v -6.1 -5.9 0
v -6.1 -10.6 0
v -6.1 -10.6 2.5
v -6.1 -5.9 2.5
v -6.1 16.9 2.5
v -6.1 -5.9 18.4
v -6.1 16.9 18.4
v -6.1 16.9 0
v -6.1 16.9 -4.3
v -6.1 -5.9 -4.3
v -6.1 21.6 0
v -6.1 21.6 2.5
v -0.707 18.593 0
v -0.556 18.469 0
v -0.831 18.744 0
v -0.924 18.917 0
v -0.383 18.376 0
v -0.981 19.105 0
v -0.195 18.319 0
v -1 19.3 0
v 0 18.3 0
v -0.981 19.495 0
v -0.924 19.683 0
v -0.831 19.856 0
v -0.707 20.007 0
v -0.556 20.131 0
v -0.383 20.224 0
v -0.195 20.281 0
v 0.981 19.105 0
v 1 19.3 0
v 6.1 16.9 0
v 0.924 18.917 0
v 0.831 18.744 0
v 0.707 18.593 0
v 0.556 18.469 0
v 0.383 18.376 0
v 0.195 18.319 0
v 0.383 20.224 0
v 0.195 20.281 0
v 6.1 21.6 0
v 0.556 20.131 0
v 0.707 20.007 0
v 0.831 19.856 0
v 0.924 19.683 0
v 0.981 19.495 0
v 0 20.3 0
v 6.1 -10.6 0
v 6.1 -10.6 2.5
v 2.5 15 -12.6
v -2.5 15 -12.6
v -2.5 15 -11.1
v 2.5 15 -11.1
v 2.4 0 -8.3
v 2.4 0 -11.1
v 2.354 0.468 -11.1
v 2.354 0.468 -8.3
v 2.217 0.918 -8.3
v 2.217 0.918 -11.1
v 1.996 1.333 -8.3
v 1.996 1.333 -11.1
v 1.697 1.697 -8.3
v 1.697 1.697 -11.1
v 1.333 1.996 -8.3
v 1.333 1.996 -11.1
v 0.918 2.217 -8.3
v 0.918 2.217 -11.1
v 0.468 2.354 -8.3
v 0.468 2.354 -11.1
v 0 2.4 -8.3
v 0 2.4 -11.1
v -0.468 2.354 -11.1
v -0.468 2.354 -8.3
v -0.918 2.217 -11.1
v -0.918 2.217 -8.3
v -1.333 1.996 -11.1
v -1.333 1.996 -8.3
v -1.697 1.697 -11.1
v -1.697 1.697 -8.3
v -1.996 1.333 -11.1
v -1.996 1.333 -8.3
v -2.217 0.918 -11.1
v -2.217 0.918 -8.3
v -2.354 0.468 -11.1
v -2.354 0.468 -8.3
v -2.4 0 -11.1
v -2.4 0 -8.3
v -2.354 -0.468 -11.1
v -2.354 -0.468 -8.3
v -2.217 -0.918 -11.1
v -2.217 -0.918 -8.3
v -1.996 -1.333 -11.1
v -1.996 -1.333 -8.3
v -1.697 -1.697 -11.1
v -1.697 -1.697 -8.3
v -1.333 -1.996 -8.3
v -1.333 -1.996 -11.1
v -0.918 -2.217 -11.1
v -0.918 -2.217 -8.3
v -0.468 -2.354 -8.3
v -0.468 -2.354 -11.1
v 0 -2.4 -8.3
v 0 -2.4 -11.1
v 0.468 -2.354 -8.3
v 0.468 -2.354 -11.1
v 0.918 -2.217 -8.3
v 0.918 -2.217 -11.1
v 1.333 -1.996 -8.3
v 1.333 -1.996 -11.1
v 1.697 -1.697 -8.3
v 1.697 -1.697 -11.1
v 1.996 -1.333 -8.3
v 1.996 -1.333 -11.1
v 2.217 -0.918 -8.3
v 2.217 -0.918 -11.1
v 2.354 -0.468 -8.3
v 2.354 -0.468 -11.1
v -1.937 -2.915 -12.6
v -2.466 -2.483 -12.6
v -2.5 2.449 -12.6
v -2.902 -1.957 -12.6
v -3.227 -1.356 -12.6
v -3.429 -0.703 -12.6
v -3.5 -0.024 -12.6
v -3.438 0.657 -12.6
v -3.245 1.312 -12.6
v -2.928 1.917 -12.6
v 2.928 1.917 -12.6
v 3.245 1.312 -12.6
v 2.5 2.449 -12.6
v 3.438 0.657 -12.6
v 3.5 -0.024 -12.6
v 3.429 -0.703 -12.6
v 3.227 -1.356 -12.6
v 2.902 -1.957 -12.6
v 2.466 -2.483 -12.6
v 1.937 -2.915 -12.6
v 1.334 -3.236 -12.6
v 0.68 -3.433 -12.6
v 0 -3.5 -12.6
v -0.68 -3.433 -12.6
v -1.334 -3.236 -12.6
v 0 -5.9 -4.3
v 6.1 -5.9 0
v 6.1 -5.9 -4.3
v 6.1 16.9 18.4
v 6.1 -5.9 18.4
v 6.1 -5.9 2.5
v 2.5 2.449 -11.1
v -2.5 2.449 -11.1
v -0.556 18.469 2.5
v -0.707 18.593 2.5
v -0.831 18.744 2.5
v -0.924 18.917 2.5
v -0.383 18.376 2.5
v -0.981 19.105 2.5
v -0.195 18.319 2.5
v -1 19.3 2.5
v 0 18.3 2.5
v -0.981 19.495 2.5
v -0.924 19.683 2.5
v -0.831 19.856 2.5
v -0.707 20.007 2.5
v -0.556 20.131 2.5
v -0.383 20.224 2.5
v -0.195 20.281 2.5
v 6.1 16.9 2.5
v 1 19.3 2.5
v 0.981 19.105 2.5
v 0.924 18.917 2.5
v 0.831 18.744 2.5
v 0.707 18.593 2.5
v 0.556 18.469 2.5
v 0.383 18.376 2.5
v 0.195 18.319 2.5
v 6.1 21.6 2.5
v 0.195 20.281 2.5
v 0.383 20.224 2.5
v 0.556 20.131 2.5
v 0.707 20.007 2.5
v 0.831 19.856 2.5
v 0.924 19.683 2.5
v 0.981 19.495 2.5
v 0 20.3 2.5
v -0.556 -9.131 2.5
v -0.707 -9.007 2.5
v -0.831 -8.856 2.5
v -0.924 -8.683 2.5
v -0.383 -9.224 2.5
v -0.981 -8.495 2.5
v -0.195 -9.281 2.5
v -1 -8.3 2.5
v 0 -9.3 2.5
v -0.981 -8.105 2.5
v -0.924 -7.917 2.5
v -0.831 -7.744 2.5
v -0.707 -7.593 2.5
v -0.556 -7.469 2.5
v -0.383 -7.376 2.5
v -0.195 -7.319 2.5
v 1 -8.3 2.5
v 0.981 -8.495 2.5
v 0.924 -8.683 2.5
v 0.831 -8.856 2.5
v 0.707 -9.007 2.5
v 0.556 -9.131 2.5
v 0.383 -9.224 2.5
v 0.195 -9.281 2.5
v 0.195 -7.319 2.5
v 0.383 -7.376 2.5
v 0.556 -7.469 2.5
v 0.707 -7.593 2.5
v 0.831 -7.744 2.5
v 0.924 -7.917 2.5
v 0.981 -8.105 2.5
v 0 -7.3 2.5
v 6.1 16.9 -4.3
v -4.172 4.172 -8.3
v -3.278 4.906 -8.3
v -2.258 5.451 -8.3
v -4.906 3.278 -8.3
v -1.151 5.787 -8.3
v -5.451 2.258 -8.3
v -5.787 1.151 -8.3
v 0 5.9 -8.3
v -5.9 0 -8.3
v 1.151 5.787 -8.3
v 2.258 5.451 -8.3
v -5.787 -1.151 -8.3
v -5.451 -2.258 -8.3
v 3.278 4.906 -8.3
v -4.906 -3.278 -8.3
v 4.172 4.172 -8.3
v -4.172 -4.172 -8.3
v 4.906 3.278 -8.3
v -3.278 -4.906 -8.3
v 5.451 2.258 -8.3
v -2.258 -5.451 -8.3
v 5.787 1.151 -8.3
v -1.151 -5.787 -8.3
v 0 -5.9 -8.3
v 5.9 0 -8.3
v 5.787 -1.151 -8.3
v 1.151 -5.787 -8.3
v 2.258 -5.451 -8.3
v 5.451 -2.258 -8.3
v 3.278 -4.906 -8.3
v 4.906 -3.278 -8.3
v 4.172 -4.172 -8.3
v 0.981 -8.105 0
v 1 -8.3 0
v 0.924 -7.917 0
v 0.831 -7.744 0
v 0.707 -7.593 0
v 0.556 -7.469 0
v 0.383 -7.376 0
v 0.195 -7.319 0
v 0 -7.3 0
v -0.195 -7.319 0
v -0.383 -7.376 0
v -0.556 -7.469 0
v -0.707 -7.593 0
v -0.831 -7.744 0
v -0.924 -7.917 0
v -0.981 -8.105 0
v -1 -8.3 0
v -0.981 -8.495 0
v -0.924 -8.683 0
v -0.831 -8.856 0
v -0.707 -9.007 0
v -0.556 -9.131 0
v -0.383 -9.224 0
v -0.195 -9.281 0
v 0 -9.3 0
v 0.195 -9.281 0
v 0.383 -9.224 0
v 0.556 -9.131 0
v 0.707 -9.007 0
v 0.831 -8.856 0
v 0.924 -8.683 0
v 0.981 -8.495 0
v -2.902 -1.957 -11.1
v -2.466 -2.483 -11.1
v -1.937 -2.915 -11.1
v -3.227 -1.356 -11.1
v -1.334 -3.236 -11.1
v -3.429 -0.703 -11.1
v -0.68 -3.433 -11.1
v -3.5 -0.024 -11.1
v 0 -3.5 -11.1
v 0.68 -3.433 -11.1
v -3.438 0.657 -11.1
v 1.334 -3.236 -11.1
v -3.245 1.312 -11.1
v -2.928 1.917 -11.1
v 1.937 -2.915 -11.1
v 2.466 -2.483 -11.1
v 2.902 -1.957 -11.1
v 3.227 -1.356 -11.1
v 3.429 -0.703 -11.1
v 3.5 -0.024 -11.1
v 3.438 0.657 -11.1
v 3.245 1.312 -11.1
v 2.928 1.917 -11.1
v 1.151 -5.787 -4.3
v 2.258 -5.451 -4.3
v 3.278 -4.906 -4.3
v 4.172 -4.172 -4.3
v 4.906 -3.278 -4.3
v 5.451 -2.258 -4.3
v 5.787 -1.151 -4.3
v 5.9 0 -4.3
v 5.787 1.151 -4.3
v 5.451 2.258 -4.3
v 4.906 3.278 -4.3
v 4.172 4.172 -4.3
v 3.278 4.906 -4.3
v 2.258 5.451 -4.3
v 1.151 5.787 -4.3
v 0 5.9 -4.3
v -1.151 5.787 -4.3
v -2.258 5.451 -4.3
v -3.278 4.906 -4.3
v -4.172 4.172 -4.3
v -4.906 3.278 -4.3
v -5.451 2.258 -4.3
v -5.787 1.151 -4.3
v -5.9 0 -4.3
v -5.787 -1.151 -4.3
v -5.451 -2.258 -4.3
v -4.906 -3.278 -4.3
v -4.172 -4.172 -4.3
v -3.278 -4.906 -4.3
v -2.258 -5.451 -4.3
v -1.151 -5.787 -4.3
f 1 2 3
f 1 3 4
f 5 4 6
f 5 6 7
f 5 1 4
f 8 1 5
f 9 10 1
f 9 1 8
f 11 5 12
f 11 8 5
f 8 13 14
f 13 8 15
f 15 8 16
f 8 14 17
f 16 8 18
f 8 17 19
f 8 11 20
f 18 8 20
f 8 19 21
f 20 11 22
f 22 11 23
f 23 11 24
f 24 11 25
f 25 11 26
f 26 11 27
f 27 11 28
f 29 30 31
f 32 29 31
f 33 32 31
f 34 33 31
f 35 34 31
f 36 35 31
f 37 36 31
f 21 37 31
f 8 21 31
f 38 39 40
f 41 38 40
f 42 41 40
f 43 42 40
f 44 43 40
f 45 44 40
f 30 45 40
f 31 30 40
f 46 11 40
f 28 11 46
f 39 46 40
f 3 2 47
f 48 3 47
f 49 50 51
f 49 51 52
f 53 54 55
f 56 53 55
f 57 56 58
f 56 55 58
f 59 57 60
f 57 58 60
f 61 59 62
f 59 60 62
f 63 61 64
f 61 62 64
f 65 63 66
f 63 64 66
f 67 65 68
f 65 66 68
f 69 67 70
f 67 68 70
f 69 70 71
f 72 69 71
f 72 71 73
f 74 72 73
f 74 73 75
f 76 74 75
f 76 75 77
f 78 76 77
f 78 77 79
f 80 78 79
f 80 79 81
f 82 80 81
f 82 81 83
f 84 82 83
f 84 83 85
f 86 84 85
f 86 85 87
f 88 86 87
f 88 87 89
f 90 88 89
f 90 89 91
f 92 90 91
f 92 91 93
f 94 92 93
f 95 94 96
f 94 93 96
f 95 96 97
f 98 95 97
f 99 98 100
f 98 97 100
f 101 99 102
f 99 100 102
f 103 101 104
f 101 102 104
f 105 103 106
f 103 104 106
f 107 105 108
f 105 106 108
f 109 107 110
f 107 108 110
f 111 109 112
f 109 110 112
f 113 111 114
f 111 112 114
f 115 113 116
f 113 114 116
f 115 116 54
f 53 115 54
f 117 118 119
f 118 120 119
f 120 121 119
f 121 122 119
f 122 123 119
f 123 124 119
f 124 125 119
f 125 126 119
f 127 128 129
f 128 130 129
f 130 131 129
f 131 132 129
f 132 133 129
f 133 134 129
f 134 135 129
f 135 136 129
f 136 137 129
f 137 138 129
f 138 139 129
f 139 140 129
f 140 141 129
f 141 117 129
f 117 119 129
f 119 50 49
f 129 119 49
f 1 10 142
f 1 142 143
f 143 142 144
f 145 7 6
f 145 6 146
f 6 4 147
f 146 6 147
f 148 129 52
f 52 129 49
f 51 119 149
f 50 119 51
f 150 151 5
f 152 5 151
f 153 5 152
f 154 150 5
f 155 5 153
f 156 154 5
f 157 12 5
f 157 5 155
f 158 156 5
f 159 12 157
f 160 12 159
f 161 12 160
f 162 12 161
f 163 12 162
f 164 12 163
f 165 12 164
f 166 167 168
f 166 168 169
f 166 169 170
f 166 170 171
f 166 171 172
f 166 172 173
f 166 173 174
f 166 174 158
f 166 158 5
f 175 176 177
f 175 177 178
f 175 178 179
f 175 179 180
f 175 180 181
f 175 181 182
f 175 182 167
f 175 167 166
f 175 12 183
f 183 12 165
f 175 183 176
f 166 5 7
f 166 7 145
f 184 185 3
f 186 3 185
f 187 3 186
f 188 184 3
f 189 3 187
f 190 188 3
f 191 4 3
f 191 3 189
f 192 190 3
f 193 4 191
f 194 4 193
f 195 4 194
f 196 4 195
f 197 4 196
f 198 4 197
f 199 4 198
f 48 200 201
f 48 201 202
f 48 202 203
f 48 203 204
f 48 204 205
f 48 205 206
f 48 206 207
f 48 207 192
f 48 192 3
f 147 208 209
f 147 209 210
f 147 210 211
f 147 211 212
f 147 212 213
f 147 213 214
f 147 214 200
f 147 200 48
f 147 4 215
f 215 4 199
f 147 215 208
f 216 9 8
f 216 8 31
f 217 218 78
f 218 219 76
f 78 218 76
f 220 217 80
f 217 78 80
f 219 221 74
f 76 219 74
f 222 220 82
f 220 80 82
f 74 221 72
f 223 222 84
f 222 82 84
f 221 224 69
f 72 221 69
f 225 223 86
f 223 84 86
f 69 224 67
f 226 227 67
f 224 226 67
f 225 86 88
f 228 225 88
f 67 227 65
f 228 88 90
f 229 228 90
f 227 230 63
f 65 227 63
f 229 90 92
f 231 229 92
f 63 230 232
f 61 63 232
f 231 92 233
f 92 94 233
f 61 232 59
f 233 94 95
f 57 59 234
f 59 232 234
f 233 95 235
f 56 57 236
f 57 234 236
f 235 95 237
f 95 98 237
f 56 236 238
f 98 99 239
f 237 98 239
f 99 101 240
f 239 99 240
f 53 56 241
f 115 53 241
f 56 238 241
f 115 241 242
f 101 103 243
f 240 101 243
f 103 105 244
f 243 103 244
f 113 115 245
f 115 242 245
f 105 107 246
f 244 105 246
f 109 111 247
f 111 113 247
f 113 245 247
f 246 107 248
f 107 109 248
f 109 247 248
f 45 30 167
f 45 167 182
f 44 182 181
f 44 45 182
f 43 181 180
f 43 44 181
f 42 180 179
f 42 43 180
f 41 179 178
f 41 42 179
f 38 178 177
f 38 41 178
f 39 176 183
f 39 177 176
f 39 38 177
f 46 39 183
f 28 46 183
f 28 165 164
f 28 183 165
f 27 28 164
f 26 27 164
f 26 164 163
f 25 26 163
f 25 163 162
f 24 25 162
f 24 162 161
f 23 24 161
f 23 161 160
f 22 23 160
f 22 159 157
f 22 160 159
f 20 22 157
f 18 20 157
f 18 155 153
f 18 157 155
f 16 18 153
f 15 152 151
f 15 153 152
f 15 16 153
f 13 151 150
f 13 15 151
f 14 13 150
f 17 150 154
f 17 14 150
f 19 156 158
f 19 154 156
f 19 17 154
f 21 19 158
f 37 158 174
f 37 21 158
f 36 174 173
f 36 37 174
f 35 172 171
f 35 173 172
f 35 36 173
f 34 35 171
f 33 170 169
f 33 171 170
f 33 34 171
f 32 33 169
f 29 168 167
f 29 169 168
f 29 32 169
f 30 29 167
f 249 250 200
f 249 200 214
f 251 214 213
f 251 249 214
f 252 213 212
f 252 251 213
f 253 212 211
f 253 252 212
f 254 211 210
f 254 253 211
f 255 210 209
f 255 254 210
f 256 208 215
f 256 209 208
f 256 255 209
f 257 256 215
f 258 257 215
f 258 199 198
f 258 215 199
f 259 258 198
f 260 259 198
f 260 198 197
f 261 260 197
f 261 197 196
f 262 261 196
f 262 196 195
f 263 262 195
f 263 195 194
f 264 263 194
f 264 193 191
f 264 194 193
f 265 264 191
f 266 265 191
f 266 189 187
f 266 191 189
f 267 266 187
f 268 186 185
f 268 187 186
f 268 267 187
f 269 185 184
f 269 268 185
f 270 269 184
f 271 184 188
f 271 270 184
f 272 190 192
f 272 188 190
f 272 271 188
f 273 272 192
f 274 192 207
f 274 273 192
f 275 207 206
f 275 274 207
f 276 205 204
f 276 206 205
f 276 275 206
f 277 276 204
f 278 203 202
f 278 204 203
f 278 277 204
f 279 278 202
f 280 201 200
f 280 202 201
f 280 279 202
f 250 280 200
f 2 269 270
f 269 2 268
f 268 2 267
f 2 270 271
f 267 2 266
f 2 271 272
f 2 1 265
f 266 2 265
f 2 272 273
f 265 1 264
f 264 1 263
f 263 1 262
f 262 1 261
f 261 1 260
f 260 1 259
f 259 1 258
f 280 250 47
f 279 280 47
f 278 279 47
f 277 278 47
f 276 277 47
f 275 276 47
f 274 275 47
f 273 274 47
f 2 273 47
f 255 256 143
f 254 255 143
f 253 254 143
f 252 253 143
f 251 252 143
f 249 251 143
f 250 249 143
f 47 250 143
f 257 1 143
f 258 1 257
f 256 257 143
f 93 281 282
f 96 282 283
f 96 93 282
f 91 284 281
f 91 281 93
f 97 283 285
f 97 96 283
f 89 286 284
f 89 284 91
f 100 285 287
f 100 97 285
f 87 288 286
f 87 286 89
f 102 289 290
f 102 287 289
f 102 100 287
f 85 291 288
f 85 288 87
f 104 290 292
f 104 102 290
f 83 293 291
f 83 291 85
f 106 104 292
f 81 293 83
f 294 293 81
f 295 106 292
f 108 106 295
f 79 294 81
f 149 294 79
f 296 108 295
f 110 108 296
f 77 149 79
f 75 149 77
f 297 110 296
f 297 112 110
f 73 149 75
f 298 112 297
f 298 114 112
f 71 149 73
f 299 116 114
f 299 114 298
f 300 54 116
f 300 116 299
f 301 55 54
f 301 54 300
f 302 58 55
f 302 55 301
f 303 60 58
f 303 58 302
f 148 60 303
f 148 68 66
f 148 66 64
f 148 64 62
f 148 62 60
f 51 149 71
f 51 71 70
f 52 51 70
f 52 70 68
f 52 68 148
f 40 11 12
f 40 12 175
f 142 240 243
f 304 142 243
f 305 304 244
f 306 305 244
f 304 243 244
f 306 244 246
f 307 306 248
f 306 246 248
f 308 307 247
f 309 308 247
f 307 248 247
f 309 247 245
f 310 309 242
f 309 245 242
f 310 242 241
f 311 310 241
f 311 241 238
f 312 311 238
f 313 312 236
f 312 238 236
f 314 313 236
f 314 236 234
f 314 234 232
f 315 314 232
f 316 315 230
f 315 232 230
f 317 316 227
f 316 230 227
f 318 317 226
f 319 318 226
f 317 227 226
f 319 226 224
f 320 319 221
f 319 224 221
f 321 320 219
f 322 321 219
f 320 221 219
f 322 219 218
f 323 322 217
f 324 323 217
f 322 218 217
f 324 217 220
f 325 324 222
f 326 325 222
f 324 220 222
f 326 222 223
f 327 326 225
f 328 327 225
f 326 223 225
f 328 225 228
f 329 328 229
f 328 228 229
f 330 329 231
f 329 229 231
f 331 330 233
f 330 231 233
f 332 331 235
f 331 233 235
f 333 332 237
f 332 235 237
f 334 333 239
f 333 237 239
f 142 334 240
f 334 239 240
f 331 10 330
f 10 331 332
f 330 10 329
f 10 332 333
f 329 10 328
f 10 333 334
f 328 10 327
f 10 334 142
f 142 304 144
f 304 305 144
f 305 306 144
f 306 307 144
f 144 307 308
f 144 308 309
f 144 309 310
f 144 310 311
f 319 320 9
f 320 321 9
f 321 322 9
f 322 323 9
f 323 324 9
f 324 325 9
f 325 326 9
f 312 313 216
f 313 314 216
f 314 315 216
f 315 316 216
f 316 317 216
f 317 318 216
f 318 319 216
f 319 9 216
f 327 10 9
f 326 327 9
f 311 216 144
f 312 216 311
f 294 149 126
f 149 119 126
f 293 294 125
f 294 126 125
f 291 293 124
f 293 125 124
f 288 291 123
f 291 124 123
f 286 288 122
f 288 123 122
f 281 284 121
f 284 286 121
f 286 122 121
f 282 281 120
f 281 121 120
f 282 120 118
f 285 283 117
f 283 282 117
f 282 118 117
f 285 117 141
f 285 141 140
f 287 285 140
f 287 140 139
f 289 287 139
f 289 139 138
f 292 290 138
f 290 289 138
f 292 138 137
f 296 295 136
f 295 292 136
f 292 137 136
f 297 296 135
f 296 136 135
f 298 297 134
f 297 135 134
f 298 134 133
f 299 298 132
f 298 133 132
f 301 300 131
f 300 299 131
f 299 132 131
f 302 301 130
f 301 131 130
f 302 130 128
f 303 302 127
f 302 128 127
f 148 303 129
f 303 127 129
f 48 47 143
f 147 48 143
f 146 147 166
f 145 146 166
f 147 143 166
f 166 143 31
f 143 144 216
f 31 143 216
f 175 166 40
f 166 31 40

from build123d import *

# Parameters (mm, degrees)
CROQUIS1_W              = 12.2
CROQUIS1_H              = 22.8
SALIENTE_EXTRUIR1_DEPTH = 22.7
CROQUIS2_W              = 12.2
CROQUIS2_H              = 32.2
SALIENTE_EXTRUIR2_DEPTH = 2.5
CROQUIS3_R              = 1
CORTAR_EXTRUIR1_DEPTH   = 4.5
CROQUIS4_R              = 5.9
SALIENTE_EXTRUIR3_DEPTH = 4
CROQUIS5_R              = 2.4
SALIENTE_EXTRUIR4_DEPTH = 2.8
CROQUIS6_R              = 3.5
SALIENTE_EXTRUIR5_DEPTH = 1.5
CROQUIS7_W              = 5
CROQUIS7_H              = 13
SALIENTE_EXTRUIR6_DEPTH = 1.5


with BuildPart() as part:
    # Croquis1 → Saliente-Extruir1 (new body)
    with BuildSketch(Plane.XY.offset(-4.3)):
        with Locations((0, 5.5)):
            Rectangle(CROQUIS1_W, CROQUIS1_H)
    extrude(amount=SALIENTE_EXTRUIR1_DEPTH)

    # Croquis2 → Saliente-Extruir2 (add)
    with BuildSketch(Plane.XY):
        with Locations((0, 5.5)):
            Rectangle(CROQUIS2_W, CROQUIS2_H)
    extrude(amount=SALIENTE_EXTRUIR2_DEPTH)

    # Croquis3 → Cortar-Extruir1 (cut)
    with BuildSketch(Plane.XY.offset(-1)):
        with Locations((0, -8.3)):
            Circle(CROQUIS3_R)
        with Locations((0, 19.3)):
            Circle(CROQUIS3_R)
    extrude(amount=CORTAR_EXTRUIR1_DEPTH, mode=Mode.SUBTRACT)

    # Croquis4 → Saliente-Extruir3 (add)
    with BuildSketch(Plane.XY.offset(-8.3)):
        with Locations(Location((0, 0, 0), (0, 0, 270))):
            Circle(CROQUIS4_R)
    extrude(amount=SALIENTE_EXTRUIR3_DEPTH)

    # Croquis5 → Saliente-Extruir4 (add)
    with BuildSketch(Plane.XY.offset(-11.1)):
        Circle(CROQUIS5_R)
    extrude(amount=SALIENTE_EXTRUIR4_DEPTH)

    # Croquis6 → Saliente-Extruir5 (add)
    with BuildSketch(Plane.XY.offset(-12.6)):
        Circle(CROQUIS6_R)
    extrude(amount=SALIENTE_EXTRUIR5_DEPTH)

    # Croquis7 → Saliente-Extruir6 (add)
    with BuildSketch(Plane.XY.offset(-12.6)):
        with Locations((0, 8.5)):
            Rectangle(CROQUIS7_W, CROQUIS7_H)
    extrude(amount=SALIENTE_EXTRUIR6_DEPTH)


solid = part.part
